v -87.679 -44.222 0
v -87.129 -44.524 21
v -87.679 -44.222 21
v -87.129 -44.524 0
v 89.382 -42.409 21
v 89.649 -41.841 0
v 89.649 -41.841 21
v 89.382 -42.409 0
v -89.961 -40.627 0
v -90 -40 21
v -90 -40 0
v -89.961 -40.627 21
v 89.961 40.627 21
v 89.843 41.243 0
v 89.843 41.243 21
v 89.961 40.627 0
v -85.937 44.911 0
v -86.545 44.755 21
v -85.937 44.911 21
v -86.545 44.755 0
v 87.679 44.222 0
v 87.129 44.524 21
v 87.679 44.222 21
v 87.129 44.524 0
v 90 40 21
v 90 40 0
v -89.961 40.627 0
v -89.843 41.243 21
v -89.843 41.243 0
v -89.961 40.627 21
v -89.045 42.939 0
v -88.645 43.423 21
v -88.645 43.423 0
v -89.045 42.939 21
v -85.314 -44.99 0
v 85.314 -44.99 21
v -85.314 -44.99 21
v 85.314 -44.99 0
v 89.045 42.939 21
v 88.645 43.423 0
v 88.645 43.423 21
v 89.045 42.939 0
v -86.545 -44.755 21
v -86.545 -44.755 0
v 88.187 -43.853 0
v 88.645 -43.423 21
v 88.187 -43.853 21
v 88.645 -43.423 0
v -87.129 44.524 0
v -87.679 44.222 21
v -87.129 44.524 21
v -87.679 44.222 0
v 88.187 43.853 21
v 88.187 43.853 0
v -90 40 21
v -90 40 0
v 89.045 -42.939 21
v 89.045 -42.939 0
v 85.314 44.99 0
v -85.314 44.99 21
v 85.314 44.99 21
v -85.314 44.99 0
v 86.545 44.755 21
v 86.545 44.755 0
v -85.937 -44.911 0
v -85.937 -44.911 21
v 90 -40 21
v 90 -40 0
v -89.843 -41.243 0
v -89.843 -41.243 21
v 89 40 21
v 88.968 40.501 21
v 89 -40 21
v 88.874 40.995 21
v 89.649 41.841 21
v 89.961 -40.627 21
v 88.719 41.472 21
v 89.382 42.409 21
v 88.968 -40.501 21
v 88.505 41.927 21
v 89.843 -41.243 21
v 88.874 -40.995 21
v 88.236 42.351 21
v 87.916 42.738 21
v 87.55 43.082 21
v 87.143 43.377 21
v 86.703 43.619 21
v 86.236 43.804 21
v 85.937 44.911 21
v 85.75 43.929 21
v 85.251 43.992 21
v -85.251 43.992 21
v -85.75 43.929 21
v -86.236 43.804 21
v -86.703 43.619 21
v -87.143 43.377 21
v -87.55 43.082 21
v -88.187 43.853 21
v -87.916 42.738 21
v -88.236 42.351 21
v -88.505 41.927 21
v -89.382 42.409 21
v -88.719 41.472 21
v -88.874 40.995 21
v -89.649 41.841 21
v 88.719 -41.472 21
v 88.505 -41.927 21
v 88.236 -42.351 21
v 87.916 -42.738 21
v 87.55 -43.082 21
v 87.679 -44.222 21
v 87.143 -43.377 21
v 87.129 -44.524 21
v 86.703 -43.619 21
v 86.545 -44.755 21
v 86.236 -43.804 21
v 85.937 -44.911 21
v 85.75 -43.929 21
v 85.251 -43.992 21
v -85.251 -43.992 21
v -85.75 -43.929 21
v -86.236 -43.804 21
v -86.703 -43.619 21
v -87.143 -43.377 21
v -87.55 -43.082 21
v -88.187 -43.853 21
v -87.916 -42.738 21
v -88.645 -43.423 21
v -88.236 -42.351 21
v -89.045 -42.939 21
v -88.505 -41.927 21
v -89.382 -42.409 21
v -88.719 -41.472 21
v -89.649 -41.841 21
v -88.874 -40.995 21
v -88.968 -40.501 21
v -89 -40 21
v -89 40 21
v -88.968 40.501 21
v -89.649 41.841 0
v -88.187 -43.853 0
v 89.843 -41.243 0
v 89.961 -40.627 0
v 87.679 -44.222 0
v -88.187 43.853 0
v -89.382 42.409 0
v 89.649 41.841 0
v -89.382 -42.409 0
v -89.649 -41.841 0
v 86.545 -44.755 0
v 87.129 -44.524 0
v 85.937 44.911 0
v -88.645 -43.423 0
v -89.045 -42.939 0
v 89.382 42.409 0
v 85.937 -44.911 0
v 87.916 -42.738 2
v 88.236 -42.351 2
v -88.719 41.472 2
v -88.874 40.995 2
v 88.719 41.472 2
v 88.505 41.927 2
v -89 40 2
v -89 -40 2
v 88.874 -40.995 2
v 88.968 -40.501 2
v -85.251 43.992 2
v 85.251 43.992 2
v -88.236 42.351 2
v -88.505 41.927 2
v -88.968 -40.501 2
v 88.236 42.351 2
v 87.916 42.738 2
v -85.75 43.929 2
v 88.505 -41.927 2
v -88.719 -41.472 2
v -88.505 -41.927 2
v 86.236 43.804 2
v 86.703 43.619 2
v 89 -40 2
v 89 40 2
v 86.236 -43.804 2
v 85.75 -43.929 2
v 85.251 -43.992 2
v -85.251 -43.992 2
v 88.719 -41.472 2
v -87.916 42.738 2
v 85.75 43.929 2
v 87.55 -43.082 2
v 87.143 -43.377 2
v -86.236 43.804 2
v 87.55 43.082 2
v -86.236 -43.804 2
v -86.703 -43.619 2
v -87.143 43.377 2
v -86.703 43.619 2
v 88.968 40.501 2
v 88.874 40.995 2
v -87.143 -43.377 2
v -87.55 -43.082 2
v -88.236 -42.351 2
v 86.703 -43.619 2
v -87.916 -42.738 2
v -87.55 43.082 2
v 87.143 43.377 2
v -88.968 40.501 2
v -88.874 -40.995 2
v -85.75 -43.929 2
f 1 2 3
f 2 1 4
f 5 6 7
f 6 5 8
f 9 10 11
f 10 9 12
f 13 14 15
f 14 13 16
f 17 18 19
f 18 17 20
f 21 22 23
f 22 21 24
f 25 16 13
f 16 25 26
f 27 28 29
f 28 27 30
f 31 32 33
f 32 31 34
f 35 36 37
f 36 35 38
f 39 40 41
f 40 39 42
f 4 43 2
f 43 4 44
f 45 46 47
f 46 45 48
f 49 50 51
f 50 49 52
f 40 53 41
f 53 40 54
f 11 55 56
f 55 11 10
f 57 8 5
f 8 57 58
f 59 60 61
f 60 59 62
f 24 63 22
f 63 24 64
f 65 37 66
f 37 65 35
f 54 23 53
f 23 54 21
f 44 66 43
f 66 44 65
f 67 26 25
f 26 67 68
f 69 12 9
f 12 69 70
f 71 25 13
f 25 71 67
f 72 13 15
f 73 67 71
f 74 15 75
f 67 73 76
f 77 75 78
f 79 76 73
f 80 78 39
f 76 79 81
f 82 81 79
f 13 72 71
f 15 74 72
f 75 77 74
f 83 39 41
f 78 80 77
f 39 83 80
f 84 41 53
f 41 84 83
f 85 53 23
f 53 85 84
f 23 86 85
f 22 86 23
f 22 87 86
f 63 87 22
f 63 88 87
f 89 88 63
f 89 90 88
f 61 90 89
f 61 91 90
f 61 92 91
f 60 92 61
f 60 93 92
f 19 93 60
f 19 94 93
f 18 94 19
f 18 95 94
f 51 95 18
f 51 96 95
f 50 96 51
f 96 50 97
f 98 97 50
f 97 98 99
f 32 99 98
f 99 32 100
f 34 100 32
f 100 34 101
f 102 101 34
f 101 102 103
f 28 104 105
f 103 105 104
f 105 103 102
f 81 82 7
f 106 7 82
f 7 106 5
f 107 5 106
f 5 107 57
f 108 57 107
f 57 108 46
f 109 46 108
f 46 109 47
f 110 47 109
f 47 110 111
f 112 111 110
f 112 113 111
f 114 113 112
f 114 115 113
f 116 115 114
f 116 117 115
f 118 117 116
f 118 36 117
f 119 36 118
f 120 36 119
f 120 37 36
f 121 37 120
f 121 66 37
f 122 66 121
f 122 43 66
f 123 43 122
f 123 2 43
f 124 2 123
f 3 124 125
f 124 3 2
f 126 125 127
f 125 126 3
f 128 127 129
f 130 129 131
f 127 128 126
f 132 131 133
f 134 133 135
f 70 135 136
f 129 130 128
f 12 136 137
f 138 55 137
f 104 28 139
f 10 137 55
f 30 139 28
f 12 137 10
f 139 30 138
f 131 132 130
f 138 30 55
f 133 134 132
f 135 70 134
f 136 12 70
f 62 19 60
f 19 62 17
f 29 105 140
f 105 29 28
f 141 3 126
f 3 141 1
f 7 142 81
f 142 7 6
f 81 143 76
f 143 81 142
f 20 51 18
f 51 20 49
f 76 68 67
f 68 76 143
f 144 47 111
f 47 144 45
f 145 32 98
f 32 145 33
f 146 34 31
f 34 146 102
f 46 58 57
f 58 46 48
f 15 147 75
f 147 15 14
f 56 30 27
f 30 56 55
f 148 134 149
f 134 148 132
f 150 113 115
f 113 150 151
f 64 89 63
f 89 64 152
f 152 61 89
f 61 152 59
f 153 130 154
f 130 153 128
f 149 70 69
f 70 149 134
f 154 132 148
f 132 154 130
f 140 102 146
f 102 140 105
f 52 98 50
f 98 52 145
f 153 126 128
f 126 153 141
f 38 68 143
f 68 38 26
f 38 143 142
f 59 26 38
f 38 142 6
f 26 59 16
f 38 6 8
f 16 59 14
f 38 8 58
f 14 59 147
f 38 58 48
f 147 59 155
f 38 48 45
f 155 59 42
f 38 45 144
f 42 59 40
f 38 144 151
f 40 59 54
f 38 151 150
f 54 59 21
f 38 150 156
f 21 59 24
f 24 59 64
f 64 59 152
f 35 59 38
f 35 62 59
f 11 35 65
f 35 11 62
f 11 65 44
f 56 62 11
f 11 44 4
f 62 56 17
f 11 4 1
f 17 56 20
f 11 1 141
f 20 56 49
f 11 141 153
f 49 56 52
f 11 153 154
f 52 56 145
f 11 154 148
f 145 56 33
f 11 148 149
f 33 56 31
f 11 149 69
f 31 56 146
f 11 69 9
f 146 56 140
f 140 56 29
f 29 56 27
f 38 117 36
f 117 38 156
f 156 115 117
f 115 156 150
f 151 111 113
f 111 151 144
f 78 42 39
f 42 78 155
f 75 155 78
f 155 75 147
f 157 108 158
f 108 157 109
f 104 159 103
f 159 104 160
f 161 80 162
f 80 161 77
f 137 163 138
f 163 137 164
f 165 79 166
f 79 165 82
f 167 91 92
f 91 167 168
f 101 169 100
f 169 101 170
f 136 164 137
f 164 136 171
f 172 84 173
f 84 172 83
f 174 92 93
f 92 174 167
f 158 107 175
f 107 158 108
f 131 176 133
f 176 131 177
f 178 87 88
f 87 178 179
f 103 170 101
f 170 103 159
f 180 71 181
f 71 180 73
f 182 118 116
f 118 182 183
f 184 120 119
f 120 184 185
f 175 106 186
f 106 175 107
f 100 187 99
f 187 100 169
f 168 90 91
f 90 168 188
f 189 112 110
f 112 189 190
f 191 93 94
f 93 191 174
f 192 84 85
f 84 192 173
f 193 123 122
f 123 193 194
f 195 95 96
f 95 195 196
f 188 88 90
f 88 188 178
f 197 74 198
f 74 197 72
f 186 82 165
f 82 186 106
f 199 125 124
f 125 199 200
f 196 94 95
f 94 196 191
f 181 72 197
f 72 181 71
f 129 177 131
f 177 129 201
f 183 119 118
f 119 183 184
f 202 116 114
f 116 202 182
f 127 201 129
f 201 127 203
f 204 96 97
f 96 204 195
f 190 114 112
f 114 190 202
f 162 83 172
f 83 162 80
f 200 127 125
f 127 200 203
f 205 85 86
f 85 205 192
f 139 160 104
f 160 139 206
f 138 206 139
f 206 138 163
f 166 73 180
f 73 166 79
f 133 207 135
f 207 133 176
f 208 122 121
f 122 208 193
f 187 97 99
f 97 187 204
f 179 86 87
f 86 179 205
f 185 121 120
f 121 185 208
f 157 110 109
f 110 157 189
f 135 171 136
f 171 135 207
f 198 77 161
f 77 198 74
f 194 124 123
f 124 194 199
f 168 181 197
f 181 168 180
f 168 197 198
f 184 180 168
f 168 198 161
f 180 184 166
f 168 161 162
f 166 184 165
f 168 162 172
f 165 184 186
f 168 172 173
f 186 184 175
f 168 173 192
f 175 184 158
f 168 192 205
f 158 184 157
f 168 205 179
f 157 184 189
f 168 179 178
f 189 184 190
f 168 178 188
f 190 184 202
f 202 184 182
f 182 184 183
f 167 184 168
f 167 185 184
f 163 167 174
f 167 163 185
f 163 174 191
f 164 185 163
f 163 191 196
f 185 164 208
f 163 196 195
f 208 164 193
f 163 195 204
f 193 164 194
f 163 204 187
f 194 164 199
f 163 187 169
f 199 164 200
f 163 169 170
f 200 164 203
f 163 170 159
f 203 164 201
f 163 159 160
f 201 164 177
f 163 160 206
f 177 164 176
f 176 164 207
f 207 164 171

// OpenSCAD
$fn = 50;


difference() {
	union() {
		hull() {
			translate(v = [-85.0000000000, 40.0000000000, 0]) {
				cylinder(h = 21, r = 5);
			}
			translate(v = [85.0000000000, 40.0000000000, 0]) {
				cylinder(h = 21, r = 5);
			}
			translate(v = [-85.0000000000, -40.0000000000, 0]) {
				cylinder(h = 21, r = 5);
			}
			translate(v = [85.0000000000, -40.0000000000, 0]) {
				cylinder(h = 21, r = 5);
			}
		}
	}
	union() {
		translate(v = [0, 0, 2]) {
			hull() {
				translate(v = [-85.0000000000, 40.0000000000, 0]) {
					cylinder(h = 19, r = 4);
				}
				translate(v = [85.0000000000, 40.0000000000, 0]) {
					cylinder(h = 19, r = 4);
				}
				translate(v = [-85.0000000000, -40.0000000000, 0]) {
					cylinder(h = 19, r = 4);
				}
				translate(v = [85.0000000000, -40.0000000000, 0]) {
					cylinder(h = 19, r = 4);
				}
			}
		}
	}
}
